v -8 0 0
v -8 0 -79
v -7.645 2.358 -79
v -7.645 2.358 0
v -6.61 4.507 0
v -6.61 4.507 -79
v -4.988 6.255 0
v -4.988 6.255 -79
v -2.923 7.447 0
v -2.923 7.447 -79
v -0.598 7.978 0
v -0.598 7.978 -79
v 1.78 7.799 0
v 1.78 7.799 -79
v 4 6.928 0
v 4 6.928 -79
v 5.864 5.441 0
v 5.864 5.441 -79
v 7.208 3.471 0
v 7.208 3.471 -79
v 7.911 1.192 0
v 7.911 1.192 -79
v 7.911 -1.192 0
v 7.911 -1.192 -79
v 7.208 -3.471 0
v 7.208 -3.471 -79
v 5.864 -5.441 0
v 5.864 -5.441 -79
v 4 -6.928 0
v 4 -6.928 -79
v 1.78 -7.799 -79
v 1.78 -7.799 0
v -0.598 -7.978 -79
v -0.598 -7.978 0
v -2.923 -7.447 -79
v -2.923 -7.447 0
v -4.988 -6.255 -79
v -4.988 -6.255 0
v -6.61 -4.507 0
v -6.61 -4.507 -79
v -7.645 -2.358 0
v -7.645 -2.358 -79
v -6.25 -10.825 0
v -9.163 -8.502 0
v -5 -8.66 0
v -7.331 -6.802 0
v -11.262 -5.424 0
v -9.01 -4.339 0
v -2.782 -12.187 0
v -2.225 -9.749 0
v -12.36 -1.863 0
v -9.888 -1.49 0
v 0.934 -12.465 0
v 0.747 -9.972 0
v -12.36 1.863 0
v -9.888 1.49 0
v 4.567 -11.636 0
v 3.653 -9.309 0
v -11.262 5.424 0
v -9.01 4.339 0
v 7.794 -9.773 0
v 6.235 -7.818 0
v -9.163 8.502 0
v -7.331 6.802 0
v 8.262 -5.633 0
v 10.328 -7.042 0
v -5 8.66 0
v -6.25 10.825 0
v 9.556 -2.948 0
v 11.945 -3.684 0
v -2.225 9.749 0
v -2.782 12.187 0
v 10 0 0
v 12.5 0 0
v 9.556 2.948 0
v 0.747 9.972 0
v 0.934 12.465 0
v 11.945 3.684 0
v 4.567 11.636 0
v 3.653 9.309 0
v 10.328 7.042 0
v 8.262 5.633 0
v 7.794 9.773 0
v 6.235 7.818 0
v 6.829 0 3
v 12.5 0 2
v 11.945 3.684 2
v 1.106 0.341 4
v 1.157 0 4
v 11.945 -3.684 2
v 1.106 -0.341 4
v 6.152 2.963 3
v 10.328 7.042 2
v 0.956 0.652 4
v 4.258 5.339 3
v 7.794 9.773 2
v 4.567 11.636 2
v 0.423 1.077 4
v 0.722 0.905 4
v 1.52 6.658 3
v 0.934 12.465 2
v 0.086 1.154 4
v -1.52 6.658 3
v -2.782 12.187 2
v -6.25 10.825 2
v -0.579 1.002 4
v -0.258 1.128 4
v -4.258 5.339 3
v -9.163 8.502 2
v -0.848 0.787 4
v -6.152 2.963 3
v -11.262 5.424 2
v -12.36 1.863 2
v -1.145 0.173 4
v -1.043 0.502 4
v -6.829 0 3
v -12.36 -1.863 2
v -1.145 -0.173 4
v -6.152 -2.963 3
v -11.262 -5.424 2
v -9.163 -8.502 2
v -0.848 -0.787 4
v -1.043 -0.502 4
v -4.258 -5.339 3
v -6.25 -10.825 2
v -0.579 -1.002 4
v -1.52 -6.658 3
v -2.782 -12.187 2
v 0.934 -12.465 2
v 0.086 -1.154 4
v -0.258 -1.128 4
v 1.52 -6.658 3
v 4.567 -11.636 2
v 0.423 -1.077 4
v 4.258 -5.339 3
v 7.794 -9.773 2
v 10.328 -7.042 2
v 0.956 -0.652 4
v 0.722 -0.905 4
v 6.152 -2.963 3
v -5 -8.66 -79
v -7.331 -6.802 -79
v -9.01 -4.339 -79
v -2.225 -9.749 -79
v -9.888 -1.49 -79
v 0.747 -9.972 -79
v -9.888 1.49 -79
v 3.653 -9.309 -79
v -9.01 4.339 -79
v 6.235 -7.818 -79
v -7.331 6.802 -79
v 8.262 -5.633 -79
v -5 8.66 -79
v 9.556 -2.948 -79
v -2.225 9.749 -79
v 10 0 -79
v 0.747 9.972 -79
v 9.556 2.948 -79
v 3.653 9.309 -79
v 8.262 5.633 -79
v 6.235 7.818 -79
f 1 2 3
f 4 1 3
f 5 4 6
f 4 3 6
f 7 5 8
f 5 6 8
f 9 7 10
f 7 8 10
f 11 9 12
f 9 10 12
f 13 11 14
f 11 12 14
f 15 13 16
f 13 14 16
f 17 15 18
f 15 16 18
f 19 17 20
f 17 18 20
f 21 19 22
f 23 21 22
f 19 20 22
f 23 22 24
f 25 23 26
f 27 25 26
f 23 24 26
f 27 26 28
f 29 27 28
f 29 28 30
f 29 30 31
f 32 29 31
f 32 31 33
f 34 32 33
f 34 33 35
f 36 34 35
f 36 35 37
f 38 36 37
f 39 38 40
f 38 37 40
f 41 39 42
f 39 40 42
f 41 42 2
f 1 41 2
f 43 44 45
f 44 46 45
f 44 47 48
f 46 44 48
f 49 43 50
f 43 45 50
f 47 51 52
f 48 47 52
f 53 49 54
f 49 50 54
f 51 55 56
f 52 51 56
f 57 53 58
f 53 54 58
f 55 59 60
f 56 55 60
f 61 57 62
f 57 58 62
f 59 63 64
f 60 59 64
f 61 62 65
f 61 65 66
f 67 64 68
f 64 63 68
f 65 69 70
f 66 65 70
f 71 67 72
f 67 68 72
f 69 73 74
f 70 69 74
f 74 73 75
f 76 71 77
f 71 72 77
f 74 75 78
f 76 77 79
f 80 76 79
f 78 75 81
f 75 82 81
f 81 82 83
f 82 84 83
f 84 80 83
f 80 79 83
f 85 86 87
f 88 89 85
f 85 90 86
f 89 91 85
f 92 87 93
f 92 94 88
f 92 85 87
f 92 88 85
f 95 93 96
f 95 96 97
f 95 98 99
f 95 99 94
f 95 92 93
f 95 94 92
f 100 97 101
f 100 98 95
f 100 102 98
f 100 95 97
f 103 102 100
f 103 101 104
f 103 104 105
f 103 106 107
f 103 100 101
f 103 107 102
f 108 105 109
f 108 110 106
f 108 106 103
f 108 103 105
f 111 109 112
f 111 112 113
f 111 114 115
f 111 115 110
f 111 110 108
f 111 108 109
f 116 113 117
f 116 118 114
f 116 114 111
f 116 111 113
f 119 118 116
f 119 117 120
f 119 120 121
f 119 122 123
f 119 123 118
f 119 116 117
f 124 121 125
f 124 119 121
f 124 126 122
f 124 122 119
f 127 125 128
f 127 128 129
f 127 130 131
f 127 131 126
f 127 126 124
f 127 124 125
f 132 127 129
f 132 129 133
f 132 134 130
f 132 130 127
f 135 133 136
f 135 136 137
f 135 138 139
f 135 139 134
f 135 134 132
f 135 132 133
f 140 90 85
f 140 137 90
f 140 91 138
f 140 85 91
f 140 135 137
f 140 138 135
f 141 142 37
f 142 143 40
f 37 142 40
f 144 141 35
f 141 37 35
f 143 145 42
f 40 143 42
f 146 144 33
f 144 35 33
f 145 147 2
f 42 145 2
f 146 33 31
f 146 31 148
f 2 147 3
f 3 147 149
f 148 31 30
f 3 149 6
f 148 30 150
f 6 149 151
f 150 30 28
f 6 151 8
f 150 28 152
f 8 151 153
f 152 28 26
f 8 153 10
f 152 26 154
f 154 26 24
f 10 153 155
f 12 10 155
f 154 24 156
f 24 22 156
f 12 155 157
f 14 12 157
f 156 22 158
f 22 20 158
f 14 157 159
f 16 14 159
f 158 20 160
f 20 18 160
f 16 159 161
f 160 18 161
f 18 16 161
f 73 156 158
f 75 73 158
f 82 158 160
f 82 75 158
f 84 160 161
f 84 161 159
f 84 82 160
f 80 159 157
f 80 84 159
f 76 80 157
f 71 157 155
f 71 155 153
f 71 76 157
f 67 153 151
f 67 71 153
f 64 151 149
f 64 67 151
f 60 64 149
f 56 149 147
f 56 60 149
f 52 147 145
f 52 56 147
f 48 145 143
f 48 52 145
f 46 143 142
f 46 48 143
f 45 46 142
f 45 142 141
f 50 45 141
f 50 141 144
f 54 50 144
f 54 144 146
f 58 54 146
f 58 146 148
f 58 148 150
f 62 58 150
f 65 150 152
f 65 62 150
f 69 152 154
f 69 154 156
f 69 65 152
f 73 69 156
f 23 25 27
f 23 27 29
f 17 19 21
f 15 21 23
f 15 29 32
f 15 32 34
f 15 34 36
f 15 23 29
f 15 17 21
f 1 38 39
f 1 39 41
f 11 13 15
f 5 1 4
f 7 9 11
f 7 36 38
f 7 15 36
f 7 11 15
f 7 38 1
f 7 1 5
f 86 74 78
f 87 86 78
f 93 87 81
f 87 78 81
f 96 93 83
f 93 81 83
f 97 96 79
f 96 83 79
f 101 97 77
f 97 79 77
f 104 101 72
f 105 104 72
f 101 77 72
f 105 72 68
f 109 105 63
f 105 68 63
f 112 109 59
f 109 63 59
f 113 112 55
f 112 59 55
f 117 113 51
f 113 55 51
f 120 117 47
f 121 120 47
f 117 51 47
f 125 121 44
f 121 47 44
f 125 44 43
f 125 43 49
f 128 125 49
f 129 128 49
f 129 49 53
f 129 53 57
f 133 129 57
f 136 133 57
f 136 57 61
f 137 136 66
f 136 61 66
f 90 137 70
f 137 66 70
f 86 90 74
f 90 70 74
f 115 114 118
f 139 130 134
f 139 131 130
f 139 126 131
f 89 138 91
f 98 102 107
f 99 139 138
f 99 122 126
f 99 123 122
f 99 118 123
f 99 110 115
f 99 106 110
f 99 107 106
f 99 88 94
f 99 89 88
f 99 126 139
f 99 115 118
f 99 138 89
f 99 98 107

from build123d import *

# Parameters (mm, degrees)
SKETCH1_R           = 10
BOSS_EXTRUDE2_DEPTH = 79
SKETCH5_R           = 12.5
BOSS_EXTRUDE3_DEPTH = 2
SKETCH6_R           = 12.5
BOSS_EXTRUDE4_DEPTH = 2
BOSS_EXTRUDE4_TAPER = 80
SKETCH7_R           = 8
CUT_EXTRUDE1_DEPTH  = 79


with BuildPart() as part:
    # Sketch1 → Boss-Extrude2 (new body)
    with BuildSketch(Plane.XY):
        Circle(SKETCH1_R)
    extrude(amount=-BOSS_EXTRUDE2_DEPTH)

    # Sketch5 → Boss-Extrude3 (add)
    with BuildSketch(Plane.XY):
        Circle(SKETCH5_R)
    extrude(amount=BOSS_EXTRUDE3_DEPTH)

    # Sketch6 → Boss-Extrude4 (add)
    with BuildSketch(Plane.XY.offset(2)):
        Circle(SKETCH6_R)
    extrude(amount=BOSS_EXTRUDE4_DEPTH, taper=BOSS_EXTRUDE4_TAPER)

    # Sketch7 → Cut-Extrude1 (cut)
    with BuildSketch(Plane(origin=(0, 0, -79), x_dir=(-1, 0, 0), z_dir=(0, 0, -1))):
        Circle(SKETCH7_R)
    extrude(amount=-CUT_EXTRUDE1_DEPTH, mode=Mode.SUBTRACT)


solid = part.part
